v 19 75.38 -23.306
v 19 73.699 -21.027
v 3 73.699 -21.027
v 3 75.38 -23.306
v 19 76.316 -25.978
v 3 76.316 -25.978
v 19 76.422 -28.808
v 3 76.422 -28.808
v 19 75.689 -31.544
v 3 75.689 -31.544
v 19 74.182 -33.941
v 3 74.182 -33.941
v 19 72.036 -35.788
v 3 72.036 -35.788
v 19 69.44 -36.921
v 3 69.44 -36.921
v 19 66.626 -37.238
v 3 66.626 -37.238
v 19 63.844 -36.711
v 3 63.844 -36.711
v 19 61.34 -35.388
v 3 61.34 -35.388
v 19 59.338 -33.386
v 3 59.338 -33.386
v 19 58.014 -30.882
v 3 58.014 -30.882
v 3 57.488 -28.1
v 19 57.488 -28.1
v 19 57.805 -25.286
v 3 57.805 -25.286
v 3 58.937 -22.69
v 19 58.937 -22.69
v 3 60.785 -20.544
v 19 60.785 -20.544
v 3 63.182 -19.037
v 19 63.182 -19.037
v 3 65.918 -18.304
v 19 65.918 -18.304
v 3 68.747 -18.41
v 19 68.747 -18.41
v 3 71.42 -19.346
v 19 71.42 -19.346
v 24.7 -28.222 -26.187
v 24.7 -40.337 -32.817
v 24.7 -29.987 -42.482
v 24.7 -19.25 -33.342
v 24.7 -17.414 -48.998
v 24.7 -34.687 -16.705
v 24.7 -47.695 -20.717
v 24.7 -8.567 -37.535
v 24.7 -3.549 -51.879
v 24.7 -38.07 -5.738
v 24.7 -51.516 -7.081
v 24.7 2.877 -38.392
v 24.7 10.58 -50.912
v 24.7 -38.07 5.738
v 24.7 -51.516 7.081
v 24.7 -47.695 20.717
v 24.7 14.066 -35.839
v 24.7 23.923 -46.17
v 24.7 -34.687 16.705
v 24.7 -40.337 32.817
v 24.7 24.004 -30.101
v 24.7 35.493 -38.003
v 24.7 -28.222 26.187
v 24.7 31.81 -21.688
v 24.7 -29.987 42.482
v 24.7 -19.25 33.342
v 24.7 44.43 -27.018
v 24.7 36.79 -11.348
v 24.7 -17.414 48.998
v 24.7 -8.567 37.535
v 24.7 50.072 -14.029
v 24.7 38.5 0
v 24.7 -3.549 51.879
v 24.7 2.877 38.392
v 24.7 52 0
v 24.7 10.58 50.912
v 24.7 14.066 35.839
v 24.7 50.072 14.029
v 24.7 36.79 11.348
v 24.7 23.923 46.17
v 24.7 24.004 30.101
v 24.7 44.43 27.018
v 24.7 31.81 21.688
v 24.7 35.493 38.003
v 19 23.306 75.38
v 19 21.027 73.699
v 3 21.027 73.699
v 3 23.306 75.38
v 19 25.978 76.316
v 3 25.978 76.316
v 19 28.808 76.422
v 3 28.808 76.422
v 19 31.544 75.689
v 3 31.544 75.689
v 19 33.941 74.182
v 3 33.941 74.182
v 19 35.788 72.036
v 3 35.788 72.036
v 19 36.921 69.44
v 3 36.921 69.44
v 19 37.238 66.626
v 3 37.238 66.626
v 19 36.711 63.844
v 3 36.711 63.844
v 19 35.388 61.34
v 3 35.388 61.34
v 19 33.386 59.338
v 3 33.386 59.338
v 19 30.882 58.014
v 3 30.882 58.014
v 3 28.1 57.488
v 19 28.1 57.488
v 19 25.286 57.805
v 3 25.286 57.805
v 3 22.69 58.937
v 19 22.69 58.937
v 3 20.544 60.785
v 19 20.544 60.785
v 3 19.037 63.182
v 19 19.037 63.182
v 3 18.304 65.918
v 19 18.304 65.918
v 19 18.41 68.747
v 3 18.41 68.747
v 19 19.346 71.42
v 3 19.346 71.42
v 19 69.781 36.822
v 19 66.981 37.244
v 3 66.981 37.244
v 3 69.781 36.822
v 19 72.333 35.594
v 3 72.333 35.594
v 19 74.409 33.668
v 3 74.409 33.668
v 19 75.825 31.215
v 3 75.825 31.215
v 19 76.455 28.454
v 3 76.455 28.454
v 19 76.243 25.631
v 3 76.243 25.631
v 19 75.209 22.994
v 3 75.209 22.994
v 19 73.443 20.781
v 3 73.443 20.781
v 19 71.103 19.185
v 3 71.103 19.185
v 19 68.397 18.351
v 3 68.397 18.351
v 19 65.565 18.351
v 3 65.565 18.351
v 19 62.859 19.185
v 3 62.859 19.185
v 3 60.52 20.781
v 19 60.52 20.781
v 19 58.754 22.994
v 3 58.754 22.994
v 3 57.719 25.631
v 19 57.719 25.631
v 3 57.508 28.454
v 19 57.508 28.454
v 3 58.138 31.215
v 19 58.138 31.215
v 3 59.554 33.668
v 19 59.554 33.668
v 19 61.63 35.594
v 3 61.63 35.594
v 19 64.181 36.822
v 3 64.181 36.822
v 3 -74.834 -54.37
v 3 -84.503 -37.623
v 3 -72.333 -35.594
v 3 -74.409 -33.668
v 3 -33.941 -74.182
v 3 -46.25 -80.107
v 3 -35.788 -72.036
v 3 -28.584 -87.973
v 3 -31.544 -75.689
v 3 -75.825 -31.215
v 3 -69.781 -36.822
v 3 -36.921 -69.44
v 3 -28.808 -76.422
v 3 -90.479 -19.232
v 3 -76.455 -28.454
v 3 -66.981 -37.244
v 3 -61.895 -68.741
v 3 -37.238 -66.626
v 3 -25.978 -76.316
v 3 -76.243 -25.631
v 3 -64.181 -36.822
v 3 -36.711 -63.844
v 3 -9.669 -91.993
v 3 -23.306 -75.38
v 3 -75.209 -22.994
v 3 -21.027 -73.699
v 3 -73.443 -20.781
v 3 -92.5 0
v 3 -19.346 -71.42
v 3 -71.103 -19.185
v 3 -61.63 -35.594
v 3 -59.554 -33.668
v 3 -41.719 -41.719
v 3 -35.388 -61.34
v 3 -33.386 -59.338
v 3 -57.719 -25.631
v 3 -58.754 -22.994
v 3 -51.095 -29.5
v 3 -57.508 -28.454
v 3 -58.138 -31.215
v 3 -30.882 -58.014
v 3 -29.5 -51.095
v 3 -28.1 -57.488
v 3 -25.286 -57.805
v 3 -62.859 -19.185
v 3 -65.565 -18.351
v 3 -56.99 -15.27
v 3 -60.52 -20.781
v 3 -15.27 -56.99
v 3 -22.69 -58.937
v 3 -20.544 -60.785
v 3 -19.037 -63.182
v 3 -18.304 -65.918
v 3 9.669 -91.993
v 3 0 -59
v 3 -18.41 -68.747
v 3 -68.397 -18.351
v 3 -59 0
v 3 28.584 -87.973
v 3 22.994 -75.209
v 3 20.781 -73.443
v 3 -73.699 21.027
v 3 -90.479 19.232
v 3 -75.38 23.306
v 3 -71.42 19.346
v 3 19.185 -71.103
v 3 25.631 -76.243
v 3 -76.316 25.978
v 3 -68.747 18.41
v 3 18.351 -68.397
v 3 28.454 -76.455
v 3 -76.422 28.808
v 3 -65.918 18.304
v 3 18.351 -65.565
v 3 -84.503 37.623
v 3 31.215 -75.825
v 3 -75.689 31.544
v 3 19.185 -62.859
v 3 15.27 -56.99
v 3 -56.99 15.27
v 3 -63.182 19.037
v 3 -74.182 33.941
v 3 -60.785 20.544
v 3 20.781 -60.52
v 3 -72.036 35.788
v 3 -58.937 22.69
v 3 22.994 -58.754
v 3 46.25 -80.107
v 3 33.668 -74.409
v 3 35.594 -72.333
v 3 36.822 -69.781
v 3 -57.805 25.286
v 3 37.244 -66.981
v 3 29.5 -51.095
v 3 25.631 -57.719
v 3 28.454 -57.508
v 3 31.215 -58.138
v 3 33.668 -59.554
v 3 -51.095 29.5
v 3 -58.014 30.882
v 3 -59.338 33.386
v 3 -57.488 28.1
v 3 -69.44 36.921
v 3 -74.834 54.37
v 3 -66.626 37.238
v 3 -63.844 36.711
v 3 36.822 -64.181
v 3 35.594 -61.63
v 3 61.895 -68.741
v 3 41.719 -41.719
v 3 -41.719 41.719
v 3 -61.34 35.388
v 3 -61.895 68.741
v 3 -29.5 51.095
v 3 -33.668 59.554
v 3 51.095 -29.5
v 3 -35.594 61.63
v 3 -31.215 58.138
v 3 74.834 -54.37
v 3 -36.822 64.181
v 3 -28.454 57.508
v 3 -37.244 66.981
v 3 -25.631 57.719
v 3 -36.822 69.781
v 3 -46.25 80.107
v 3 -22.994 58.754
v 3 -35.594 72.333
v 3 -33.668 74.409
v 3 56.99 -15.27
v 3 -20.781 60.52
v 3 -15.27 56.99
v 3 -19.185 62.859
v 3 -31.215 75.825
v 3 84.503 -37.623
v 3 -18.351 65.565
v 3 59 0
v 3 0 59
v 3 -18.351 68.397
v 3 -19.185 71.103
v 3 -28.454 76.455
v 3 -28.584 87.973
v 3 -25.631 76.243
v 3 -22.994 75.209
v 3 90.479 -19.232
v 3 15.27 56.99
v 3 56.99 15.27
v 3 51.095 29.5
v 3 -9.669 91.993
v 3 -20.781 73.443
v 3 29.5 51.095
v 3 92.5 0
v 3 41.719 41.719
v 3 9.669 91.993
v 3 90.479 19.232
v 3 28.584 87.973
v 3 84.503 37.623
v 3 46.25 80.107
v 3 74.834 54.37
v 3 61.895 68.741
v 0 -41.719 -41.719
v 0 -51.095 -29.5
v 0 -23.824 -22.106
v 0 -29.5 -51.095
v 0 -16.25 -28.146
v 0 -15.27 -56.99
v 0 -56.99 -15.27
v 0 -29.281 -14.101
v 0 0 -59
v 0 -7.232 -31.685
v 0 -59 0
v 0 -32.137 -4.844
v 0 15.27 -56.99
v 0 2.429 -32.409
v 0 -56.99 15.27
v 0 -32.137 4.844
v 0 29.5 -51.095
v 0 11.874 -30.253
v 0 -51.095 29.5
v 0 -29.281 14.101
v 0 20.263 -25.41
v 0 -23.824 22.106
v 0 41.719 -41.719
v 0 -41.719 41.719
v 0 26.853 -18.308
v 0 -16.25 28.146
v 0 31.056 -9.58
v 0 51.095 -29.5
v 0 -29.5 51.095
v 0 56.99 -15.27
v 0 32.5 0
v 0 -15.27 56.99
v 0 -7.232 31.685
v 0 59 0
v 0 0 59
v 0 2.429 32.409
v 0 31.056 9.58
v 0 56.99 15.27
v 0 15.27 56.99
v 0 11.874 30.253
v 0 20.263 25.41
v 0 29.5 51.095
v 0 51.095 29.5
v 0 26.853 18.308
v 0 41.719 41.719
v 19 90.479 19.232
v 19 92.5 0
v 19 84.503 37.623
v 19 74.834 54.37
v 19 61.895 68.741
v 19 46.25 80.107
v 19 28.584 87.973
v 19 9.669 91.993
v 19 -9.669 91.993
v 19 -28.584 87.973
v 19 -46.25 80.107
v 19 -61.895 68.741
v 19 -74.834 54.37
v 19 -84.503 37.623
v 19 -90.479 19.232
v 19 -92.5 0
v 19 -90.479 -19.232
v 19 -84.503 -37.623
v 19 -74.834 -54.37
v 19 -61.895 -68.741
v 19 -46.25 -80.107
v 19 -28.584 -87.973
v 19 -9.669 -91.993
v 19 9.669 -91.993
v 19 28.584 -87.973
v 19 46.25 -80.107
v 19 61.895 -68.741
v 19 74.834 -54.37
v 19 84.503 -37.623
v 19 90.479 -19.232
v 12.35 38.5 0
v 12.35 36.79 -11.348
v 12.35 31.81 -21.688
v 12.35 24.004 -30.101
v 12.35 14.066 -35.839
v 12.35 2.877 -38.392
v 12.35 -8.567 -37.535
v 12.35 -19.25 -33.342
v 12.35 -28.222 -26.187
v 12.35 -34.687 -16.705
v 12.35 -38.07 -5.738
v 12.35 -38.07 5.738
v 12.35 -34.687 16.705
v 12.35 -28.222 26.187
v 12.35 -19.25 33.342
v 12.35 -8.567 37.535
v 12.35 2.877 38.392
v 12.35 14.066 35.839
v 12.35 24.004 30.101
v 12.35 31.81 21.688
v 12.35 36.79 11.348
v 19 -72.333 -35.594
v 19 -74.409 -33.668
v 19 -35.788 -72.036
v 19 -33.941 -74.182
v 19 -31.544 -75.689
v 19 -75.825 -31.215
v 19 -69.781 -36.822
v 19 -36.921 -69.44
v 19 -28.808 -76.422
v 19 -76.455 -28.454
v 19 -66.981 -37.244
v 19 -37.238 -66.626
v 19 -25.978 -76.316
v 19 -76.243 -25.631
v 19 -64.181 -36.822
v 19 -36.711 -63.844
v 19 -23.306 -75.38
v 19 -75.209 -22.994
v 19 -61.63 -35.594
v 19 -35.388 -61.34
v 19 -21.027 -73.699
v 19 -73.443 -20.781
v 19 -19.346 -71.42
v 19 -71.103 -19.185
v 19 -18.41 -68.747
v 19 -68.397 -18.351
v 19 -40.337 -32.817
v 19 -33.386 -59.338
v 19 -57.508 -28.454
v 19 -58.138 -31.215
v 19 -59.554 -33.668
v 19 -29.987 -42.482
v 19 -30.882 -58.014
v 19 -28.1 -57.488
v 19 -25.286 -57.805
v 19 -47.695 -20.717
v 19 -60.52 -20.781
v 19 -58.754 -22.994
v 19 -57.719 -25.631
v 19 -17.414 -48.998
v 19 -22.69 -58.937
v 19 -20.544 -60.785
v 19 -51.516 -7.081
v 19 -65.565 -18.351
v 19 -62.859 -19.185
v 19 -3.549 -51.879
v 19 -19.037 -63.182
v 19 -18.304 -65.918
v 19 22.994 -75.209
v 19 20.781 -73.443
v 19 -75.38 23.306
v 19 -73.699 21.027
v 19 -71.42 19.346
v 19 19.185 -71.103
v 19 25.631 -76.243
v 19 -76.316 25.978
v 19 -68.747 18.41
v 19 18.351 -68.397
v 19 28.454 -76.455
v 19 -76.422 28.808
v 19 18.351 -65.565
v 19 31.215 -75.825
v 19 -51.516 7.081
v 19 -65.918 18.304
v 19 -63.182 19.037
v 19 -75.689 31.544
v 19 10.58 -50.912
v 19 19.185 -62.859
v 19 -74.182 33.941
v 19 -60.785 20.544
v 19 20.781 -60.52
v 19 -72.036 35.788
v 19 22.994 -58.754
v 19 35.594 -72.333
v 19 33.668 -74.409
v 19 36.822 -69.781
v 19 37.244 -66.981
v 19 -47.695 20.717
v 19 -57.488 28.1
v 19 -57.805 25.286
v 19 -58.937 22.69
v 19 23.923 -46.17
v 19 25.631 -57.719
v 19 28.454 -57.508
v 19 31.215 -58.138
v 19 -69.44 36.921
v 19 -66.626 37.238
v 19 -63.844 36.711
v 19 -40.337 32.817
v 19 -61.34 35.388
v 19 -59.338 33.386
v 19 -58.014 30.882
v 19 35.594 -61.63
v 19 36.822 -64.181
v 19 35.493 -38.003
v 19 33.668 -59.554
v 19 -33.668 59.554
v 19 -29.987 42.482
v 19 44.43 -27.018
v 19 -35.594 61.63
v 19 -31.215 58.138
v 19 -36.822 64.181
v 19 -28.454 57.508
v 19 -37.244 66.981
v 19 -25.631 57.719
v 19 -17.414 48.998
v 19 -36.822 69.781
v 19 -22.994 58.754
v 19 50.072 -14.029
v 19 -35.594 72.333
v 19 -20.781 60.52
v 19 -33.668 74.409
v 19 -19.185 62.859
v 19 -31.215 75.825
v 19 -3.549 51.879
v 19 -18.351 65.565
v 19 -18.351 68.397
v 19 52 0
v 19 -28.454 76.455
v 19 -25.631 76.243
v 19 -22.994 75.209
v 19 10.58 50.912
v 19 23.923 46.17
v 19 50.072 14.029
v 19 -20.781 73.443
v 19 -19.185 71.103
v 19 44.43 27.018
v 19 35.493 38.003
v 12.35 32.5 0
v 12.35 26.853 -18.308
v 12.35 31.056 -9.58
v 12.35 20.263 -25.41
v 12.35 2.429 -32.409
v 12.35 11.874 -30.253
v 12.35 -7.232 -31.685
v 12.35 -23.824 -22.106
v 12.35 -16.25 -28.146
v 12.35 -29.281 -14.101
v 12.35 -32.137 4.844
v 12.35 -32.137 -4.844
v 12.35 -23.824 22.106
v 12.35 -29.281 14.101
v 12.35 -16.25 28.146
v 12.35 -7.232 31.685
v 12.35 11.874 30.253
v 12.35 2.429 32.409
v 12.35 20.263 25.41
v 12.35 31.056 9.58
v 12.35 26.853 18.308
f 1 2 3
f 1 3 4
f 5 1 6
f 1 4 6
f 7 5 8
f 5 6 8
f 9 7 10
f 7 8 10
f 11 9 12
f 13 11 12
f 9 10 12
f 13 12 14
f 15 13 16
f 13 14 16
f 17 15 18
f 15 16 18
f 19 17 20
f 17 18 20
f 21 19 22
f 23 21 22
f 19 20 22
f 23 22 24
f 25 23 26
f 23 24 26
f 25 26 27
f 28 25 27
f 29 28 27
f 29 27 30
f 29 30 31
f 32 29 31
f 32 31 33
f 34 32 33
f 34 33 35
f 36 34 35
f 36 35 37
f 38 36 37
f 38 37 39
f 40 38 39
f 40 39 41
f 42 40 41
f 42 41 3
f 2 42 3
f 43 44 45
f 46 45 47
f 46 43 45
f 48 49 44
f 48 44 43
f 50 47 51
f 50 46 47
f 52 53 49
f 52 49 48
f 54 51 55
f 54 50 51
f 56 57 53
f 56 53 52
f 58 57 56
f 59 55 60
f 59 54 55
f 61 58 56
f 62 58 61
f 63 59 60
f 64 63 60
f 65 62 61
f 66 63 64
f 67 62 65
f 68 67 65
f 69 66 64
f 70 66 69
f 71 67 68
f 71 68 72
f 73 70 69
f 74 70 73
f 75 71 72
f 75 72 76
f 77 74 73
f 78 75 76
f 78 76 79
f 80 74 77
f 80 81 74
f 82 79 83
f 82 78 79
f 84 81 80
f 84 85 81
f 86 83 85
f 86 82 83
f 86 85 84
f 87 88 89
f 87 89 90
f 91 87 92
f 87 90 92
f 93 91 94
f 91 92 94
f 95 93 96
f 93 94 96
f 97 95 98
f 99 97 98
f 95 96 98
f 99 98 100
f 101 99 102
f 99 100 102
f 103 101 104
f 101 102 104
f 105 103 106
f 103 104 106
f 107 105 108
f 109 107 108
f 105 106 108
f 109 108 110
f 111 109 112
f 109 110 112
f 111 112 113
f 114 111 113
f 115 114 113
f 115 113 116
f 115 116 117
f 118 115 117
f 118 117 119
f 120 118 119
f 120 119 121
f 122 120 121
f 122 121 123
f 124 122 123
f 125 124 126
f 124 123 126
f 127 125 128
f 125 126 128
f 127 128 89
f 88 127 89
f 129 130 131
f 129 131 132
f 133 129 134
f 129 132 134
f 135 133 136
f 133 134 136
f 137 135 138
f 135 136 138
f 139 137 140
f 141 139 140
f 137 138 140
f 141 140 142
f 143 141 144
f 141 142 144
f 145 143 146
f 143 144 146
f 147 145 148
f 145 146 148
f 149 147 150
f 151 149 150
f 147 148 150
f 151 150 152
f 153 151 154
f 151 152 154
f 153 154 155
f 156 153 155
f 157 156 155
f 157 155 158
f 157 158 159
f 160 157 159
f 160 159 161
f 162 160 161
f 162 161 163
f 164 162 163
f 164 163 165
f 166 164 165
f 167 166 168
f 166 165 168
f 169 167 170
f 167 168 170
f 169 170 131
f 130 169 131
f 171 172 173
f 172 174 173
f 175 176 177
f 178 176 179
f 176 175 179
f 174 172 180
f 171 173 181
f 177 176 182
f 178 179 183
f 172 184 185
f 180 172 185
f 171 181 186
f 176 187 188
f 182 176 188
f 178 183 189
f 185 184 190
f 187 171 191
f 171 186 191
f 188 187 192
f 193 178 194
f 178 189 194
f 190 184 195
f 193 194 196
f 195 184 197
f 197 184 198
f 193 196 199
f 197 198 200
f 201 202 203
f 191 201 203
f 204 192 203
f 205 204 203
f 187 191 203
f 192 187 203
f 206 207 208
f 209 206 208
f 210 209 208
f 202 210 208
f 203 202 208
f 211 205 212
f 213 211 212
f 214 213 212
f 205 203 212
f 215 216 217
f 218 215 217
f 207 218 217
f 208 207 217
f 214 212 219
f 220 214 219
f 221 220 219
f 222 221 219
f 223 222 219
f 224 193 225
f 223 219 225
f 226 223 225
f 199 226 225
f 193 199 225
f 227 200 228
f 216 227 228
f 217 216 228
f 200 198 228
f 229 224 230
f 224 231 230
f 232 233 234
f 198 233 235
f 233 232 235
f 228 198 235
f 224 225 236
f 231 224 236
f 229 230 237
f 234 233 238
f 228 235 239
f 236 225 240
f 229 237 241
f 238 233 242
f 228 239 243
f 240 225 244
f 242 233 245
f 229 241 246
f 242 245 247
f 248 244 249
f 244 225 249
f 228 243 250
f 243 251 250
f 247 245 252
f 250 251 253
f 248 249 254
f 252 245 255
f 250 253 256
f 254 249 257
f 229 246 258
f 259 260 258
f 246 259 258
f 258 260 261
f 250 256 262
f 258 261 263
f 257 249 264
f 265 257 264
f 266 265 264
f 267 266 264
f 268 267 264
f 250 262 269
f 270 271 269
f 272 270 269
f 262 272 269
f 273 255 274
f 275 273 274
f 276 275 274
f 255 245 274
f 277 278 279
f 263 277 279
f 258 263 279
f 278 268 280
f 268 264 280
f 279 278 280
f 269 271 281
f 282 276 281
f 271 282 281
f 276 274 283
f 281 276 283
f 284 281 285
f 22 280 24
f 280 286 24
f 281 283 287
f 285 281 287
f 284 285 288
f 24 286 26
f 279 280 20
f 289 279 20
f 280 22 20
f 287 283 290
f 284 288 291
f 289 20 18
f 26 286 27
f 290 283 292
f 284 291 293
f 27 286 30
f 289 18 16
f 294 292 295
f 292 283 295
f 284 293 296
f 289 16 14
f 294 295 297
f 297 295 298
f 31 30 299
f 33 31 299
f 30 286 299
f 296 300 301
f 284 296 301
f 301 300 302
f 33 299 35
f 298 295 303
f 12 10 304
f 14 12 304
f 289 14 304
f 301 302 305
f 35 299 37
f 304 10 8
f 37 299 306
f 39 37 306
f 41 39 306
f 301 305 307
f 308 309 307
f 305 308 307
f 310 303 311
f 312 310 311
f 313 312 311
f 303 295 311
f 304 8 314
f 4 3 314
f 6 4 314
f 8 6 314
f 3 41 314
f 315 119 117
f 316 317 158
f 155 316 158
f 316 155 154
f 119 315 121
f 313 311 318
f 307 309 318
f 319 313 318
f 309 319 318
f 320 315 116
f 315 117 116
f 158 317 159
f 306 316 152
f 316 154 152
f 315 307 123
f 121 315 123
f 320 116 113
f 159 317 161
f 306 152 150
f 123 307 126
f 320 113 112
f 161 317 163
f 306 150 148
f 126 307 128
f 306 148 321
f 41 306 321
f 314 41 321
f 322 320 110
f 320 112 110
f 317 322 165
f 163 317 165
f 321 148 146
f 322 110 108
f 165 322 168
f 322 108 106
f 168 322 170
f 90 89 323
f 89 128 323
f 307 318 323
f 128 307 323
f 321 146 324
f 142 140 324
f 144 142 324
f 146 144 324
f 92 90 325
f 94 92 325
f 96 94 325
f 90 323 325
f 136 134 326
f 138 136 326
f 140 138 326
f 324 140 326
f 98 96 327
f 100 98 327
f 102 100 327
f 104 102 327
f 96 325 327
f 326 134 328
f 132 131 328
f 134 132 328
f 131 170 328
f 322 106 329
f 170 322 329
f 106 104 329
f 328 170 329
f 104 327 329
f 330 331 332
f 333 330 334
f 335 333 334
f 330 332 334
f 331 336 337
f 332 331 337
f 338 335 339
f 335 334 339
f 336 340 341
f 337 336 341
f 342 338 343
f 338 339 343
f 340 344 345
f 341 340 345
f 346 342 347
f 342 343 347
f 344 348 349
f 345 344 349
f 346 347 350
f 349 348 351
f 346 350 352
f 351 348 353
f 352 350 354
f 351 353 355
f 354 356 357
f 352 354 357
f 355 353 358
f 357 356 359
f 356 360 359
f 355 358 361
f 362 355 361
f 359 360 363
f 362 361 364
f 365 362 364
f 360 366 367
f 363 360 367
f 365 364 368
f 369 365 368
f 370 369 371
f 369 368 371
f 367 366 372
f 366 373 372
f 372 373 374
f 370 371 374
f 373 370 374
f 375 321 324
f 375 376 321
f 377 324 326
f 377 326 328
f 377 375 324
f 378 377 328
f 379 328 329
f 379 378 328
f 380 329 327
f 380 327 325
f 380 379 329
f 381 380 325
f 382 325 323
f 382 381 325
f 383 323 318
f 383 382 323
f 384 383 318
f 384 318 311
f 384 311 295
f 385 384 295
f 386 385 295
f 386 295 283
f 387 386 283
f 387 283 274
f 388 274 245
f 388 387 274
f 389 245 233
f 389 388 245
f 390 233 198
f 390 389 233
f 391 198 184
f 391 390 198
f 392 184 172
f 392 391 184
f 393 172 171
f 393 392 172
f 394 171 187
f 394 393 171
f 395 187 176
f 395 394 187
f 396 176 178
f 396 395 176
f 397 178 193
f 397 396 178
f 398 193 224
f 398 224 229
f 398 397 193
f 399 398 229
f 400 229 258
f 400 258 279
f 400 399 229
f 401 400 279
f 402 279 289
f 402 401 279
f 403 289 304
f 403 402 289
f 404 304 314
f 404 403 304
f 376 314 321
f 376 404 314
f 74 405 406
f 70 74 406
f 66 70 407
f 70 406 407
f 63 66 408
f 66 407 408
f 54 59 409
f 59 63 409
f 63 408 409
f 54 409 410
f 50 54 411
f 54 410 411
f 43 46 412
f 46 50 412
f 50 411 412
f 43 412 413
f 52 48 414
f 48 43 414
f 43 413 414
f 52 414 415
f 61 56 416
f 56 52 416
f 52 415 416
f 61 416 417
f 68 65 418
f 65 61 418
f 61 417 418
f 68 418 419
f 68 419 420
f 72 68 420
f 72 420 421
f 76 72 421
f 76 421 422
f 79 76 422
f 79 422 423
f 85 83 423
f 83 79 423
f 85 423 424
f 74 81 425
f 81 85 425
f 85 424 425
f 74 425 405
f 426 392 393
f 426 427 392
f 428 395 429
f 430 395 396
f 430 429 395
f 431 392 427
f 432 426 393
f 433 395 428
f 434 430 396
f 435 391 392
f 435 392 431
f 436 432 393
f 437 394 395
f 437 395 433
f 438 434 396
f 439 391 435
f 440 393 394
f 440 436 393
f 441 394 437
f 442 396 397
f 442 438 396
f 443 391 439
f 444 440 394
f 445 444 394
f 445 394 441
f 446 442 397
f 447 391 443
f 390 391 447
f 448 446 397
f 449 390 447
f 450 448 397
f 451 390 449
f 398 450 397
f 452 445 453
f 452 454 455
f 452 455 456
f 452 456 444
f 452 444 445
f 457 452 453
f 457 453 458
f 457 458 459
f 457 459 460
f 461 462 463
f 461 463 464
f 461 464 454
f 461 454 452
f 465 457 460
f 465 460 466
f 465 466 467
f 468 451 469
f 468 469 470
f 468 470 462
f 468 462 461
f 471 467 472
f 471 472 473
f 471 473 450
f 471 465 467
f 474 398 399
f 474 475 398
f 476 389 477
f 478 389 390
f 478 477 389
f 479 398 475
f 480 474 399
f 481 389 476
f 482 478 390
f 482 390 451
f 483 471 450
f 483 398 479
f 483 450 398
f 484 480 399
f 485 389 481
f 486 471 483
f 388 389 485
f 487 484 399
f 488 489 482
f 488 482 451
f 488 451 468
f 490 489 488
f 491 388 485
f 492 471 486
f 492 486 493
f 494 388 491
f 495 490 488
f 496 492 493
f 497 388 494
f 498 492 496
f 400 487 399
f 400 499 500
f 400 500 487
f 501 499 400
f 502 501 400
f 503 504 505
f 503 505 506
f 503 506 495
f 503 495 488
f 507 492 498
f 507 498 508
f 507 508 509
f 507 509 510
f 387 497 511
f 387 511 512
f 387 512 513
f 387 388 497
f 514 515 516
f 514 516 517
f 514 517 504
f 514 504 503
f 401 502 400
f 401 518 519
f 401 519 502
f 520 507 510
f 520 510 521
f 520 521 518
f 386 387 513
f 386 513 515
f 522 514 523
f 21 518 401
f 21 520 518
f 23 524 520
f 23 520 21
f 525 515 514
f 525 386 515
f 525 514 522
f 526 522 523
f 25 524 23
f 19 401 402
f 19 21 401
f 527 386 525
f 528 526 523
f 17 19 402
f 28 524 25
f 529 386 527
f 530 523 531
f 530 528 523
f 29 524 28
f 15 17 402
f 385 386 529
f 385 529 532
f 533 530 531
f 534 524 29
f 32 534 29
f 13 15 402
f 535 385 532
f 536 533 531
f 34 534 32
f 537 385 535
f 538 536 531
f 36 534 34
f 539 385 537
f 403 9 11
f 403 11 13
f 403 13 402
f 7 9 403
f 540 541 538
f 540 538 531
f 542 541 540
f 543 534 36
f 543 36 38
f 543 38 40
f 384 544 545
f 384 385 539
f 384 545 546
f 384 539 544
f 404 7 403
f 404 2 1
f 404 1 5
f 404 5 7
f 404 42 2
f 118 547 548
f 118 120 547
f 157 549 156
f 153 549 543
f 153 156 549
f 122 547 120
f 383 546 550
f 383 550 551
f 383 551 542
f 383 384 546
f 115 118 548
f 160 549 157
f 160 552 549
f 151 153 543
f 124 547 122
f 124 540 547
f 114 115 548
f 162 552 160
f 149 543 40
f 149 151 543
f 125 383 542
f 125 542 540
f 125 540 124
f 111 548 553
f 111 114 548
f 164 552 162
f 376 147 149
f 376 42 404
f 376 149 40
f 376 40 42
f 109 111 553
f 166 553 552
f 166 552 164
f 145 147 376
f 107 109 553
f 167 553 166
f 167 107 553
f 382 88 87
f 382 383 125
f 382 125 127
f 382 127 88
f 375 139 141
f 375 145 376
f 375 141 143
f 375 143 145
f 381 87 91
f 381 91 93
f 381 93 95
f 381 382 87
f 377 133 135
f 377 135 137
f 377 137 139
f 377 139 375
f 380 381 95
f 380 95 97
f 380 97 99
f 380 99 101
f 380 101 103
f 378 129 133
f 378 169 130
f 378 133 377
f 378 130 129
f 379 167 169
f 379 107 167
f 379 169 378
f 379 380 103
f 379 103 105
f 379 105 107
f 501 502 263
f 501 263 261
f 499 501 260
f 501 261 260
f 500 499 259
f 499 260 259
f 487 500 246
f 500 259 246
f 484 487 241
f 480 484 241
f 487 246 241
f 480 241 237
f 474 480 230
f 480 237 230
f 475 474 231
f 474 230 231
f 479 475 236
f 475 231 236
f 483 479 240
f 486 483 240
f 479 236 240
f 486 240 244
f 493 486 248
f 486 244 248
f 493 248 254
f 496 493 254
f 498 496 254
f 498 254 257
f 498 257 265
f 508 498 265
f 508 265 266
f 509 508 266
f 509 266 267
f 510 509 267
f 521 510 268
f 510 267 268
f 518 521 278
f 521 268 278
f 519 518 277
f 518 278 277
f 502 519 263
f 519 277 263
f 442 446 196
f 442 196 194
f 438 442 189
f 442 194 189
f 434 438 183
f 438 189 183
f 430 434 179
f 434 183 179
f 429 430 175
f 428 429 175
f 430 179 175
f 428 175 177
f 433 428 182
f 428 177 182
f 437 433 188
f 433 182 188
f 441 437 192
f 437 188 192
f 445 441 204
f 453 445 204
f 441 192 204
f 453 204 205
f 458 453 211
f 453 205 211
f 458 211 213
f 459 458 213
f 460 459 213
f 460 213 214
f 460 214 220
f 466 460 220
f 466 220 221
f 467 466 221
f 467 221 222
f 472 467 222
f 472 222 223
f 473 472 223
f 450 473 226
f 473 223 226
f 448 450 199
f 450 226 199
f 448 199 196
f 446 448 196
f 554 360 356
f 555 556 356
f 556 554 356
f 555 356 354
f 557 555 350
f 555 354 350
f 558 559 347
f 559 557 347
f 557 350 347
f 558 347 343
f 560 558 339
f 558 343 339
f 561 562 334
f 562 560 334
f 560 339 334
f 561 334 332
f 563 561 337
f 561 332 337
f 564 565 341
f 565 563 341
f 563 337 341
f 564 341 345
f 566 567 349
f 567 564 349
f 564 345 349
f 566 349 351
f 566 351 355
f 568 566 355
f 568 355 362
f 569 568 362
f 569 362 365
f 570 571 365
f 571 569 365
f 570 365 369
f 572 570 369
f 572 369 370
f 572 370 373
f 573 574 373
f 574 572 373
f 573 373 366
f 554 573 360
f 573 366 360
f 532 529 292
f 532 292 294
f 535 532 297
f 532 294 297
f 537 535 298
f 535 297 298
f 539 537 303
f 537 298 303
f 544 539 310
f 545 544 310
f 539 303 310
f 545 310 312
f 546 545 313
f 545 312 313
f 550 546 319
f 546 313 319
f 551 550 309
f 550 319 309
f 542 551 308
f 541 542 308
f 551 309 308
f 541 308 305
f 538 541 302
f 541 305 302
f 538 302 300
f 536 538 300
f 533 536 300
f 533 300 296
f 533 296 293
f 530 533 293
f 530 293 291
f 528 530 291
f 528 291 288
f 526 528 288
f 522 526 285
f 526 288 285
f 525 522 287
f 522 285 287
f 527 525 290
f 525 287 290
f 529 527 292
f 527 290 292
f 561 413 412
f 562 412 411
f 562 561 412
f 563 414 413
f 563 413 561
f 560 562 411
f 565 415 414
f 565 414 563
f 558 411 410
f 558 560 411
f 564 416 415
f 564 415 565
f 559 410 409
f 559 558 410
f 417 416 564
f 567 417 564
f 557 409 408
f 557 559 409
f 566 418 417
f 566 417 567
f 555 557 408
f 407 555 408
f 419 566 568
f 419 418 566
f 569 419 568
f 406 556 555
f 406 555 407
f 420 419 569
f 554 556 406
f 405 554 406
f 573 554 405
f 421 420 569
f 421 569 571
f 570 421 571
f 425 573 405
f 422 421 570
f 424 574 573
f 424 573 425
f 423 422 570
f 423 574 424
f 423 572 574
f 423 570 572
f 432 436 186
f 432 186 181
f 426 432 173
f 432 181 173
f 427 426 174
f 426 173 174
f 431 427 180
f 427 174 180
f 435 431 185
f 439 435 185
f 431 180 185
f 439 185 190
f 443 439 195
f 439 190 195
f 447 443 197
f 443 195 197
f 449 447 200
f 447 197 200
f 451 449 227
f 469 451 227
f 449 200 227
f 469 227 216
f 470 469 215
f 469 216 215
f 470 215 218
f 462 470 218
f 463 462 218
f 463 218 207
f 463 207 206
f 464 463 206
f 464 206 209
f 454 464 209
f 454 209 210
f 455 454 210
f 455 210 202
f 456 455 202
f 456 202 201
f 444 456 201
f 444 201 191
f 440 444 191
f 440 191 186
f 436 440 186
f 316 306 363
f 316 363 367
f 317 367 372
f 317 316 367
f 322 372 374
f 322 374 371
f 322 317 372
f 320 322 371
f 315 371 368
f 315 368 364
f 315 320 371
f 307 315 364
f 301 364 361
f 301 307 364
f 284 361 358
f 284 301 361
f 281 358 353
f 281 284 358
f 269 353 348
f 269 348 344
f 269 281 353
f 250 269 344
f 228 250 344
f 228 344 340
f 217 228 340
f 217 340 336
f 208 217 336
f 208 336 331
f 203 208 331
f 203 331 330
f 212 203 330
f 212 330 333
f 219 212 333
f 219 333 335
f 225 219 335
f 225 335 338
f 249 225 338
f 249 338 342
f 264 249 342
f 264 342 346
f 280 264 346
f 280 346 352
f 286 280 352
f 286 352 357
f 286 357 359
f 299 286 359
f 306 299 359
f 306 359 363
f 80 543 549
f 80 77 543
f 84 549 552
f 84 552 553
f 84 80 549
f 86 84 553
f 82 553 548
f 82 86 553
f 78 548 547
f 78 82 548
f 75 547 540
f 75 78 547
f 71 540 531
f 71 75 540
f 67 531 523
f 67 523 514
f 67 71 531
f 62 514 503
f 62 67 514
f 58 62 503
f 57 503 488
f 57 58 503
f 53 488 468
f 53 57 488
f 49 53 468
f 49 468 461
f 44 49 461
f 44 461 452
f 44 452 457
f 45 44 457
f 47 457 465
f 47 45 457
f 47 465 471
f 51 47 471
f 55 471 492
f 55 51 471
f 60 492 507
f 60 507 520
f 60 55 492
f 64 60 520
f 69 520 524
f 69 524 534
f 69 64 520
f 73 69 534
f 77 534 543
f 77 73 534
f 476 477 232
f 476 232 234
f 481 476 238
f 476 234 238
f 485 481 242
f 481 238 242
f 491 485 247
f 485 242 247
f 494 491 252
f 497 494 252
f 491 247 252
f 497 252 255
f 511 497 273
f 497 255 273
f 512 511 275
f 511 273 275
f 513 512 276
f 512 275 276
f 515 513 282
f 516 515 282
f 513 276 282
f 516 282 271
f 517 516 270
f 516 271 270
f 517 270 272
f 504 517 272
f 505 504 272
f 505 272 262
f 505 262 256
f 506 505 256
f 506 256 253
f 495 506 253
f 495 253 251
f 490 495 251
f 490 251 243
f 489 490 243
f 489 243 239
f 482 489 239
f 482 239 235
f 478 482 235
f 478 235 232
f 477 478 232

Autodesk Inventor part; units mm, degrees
ref_plane "YZ Plane" through (0, 0, 0) normal (1, 0, 0) x (0, 1, 0)
ref_plane "XZ Plane" through (0, 0, 0) normal (0, 1, 0) x (-1, 0, 0)
ref_plane "XY Plane" through (0, 0, 0) normal (0, 0, 1) x (1, 0, 0)
sketch "Sketch1" plane through (0, 0, 0) normal (0, 0, 1) x (1, 0, 0)
  line L0 (0, 0) -> (24.7, 0) construction
  line L1 (0, 59) -> (3, 59)
  line L2 (3, 92.5) -> (19, 92.5)
  line L3 (3, 92.5) -> (3, 59)
  line L4 (19, 92.5) -> (19, 52)
  line L5 (24.7, 38.5) -> (24.7, 0) construction
  line L6 (19, 52) -> (24.7, 52)
  line L7 (24.7, 52) -> (24.7, 38.5)
  line L8 (24.7, 38.5) -> (12.35, 38.5)
  line L9 (12.35, 38.5) -> (12.35, 32.5)
  line L10 (12.35, 32.5) -> (0, 32.5)
  line L11 (0, 32.5) -> (0, 0) construction
  line L12 (0, 59) -> (0, 32.5)
  dimension "d0" = 118
  dimension "d1" = 185
  dimension "d2" = 104
  dimension "d7" = 77
  dimension "d8" = 65
  dimension "d9" = 19
  dimension "d10" = 3
  dimension "d12" = 12.35
  dimension "d13" = 24.7
revolve "Revolution1" add sketch "Sketch1" angle 360 about axis through (0, 0, 0) along (1, 0, 0)
sketch "Sketch2" plane through (3, 0, 0) normal (-1, 0, 0) x (0, 0, 1)
  circle A0 centre (0, 0) radius 59 projected
  line L0 (0, 0) -> (0, 72.5) construction
  circle A1 centre (0, 0) radius 92.5 projected
  circle A2 centre (0, 0) radius 72.5 construction
  line L1 (0, 0) -> (27.7445, 66.9813) construction
  circle A3 centre (27.7445, 66.9813) radius 9.5
  dimension "d14" = 19
  dimension "d15" = 72.5
  dimension "d16" = 22.5
extrude "Extrusion1" cut sketch "Sketch2" against normal blind 19 contours A3
pattern_circular "Circular Pattern1" count 8 over 360 about axis through (1.5, 0, 0) along (1, 0, 0) of "Extrusion1"
equation "\"d0\" = D1"
equation "\"d1\" = D"
equation "\"d2\" = N3"
equation "\"d7\" = ID + 2 * t"
equation "\"d8\" = ID"
equation "\"d9\" = C1"
equation "\"d10\" = F1"
equation "\"d12\" = 0.65 * C1"
equation "\"d13\" = 1.3 * C1"
equation "\"d14\" = L"
equation "\"d15\" = 0.5 * K1"
equation "\"d3\" = C1"
equation "\"C1\" = 19"
equation "\"D\" = 185"
equation "\"K1\" = 145"
equation "\"L\" = 19"
equation "\"N3\" = 104"
equation "\"D1\" = 118"
equation "\"H1\" = 17"
equation "\"F1\" = 3"
equation "\"ID\" = 65"
equation "\"t\" = 6"
equation "\"Size_Designation\" = 1.2345"
properties part number "DIN EN 1092-2 Hubbed Socket Welding Flange Type 14 - PN 40 Ductile Iron DN65" material "Iron, Ductile"
